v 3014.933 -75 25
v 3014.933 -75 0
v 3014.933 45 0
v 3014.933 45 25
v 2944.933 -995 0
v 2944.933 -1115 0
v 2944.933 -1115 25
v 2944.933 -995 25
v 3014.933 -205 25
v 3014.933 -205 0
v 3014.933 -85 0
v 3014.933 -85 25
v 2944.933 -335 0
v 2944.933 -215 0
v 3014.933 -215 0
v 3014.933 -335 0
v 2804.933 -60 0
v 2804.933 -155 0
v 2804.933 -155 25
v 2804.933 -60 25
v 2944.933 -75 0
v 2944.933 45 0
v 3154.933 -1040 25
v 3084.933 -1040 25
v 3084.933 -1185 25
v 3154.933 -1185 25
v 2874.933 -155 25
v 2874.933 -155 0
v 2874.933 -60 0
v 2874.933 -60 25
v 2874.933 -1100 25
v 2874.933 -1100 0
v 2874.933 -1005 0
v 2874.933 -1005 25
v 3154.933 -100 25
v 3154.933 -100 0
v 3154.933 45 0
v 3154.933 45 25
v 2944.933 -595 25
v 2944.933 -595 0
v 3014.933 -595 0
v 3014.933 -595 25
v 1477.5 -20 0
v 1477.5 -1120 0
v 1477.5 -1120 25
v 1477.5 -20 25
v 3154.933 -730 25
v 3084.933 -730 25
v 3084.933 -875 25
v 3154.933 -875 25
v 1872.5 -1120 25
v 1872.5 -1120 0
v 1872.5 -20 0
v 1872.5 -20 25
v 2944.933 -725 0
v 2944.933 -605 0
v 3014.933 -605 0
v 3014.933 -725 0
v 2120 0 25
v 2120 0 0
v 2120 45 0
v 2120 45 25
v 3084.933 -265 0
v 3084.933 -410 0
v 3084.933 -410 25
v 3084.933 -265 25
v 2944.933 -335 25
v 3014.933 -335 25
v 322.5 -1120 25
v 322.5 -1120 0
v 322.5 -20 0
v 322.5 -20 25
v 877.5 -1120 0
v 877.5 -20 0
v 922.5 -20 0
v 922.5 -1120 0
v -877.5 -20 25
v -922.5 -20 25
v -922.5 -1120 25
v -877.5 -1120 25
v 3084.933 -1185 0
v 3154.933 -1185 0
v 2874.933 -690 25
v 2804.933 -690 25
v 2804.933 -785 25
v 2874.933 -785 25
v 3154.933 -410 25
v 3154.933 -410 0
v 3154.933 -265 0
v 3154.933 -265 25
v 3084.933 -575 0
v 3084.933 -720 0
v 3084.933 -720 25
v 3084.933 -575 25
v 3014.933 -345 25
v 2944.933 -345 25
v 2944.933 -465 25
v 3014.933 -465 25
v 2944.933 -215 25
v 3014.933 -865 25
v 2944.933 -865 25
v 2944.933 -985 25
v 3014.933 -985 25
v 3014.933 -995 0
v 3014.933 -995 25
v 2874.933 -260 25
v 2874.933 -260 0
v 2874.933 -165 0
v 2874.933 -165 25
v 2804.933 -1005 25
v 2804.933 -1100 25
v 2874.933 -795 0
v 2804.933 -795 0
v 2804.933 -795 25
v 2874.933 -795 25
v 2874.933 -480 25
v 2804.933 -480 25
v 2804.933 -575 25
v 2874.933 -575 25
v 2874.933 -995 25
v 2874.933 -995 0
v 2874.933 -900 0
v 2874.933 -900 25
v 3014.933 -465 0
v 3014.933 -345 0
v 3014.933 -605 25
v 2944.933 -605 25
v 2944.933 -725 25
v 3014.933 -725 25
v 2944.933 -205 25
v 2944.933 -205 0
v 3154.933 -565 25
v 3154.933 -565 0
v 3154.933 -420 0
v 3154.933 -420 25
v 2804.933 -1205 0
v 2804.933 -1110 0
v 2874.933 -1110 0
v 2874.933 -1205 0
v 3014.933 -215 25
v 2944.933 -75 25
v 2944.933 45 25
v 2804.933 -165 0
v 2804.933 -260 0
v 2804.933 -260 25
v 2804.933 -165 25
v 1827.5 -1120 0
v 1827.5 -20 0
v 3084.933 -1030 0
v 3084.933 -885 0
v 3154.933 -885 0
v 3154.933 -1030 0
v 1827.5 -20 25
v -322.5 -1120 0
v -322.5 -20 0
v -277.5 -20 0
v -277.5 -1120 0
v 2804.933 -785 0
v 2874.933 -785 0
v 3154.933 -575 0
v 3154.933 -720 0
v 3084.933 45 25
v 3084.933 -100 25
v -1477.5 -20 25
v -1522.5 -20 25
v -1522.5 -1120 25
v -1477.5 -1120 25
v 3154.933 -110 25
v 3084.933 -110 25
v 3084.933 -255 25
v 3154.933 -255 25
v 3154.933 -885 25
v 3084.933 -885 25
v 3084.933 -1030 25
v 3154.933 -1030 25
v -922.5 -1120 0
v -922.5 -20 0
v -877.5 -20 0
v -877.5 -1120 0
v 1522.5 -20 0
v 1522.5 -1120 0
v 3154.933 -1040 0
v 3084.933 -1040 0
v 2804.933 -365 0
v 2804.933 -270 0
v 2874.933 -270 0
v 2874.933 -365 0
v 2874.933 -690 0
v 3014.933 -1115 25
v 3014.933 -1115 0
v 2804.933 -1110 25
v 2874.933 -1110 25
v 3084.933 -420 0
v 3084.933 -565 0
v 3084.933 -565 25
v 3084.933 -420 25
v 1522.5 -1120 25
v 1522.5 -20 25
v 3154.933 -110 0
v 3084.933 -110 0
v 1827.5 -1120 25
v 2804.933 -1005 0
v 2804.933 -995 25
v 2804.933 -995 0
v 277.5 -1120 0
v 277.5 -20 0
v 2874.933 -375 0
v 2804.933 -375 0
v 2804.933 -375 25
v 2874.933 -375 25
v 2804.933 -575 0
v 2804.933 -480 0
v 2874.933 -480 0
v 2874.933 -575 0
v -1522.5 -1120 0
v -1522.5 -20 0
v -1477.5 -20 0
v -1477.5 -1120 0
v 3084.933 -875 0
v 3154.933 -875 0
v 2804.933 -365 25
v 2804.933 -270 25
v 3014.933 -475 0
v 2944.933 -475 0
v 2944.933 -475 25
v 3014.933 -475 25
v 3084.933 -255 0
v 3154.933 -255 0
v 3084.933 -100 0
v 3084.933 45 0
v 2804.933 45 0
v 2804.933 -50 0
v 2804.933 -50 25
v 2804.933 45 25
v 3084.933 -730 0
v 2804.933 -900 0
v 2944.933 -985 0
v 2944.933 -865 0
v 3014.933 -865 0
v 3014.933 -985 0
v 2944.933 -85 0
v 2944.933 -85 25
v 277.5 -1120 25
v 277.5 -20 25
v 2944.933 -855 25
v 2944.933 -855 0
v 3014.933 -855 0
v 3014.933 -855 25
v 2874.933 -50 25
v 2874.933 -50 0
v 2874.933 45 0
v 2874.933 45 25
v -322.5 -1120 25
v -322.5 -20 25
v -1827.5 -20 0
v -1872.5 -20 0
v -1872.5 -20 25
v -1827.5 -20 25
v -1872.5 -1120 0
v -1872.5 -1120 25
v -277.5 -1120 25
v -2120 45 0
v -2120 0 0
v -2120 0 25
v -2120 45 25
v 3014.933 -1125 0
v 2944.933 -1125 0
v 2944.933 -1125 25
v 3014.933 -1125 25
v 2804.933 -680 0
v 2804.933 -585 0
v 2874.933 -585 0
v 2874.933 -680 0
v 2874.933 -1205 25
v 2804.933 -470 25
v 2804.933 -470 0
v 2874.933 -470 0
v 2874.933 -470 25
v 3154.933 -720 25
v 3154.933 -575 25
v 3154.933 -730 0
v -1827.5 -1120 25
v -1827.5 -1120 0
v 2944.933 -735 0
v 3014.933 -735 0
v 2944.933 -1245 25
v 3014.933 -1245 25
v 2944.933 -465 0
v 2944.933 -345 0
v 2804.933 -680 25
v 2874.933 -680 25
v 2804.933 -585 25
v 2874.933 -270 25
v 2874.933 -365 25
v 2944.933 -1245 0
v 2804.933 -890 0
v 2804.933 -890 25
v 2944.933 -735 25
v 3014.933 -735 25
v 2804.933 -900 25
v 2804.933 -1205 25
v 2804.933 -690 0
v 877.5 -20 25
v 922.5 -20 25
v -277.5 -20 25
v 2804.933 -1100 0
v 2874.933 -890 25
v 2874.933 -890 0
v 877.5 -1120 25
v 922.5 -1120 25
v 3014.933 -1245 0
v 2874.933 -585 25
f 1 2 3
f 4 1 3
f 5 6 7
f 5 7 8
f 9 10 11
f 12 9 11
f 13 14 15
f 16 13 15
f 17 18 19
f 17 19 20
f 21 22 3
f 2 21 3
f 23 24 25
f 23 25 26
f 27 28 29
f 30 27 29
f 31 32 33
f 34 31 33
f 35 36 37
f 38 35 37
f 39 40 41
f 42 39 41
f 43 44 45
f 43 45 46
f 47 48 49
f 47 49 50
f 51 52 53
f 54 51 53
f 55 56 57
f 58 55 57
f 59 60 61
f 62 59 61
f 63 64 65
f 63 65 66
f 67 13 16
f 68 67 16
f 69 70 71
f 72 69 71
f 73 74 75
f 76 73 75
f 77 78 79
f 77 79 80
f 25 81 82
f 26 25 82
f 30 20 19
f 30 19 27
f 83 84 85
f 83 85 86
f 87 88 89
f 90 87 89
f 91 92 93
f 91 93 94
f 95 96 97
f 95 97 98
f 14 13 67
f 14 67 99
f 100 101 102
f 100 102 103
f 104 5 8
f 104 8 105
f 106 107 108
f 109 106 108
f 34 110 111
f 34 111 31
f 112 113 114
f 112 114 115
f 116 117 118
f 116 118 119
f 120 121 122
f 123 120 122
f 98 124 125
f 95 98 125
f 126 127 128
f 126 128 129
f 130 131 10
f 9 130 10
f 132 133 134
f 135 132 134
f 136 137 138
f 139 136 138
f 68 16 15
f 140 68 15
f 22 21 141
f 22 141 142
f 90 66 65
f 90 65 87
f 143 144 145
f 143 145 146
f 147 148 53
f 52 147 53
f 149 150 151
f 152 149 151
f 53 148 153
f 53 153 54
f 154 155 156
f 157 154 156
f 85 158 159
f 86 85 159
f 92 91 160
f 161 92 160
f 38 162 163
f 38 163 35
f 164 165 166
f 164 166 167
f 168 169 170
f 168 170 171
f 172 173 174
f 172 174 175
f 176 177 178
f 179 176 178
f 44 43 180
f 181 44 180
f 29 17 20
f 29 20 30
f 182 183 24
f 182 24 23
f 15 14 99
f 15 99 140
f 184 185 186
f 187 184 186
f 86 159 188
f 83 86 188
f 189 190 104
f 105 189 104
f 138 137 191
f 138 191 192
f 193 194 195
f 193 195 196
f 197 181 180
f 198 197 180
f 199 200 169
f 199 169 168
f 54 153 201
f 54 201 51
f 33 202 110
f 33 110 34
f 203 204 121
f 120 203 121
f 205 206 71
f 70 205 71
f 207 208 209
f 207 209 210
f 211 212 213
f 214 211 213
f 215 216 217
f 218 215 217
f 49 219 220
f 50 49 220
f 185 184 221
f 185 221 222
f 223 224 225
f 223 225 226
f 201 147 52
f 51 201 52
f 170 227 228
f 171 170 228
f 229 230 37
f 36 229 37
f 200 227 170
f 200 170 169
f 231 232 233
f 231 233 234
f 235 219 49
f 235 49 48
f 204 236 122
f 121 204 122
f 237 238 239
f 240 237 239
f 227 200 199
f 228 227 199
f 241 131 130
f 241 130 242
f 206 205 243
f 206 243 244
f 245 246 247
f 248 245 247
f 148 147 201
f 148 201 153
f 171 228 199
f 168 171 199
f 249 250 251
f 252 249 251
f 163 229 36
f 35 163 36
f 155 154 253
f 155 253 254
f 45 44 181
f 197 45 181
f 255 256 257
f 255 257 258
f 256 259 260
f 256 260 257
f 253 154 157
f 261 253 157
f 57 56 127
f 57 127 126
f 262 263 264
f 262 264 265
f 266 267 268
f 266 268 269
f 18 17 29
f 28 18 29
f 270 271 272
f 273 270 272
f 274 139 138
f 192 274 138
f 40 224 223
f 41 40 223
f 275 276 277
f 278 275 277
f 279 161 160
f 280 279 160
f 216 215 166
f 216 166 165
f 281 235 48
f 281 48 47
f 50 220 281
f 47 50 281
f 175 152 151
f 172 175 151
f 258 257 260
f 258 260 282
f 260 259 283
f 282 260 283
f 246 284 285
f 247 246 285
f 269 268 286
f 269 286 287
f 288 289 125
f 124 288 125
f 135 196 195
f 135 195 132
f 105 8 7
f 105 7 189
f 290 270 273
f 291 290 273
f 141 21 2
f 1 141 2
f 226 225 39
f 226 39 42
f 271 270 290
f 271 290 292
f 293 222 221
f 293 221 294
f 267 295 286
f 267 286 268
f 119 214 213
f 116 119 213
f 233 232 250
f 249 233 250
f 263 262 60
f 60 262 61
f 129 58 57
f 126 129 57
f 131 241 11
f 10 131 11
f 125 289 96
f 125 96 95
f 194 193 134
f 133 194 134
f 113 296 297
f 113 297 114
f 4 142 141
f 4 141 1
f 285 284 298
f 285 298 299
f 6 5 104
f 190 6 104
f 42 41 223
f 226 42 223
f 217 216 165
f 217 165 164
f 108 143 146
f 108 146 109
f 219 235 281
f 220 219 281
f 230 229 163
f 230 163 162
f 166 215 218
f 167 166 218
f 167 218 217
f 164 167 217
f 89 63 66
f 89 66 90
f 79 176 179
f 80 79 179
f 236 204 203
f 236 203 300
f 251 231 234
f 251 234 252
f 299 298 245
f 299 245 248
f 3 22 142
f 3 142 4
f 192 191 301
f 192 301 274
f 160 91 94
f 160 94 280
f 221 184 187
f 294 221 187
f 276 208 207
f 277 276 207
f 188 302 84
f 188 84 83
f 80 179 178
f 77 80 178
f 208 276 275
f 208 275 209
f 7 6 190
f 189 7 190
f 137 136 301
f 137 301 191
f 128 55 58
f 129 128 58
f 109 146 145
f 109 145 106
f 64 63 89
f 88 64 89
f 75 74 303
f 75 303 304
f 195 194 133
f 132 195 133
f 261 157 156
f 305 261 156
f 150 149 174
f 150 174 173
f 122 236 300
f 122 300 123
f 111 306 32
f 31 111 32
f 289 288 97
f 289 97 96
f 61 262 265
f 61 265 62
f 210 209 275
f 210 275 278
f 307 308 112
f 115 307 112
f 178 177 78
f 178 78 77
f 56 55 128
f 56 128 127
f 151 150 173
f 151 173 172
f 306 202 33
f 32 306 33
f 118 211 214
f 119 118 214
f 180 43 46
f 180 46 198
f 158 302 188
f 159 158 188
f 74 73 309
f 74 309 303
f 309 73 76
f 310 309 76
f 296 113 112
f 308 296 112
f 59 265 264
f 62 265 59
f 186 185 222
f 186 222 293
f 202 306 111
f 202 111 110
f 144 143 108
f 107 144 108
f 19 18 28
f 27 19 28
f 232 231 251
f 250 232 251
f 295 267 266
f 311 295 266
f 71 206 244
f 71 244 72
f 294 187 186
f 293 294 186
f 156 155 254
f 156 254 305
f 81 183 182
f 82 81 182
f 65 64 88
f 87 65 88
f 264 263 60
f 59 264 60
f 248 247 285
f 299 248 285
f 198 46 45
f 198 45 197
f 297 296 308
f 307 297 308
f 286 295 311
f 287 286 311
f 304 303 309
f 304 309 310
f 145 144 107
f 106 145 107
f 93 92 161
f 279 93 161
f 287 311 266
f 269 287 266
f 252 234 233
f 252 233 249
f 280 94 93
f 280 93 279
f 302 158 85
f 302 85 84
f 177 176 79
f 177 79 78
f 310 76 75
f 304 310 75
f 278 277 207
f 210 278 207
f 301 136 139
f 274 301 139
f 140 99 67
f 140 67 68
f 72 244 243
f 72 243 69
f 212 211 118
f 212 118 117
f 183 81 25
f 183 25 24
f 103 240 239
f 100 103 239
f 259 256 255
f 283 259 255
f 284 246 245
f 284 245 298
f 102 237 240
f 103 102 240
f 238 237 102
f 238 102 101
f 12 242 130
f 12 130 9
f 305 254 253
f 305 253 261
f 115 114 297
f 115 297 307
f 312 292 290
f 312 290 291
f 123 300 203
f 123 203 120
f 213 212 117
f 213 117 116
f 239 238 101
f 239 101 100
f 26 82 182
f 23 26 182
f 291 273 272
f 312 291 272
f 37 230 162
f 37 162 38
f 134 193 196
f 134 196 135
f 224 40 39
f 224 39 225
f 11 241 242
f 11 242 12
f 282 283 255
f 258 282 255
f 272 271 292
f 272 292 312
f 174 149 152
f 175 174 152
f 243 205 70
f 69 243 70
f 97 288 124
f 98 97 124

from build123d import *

# Parameters (mm, degrees)
F0_W     = 4240
F0_H     = 45
F0_W_2   = 45
F0_H_2   = 1100
F0_W_3   = 70
F0_H_3   = 95
F0_H_4   = 120
F0_H_5   = 145
F1_DEPTH = 25


with BuildPart() as f1:
    # F0 (on Top) → F1 (new body)
    with BuildSketch(Plane.XY):
        with Locations((0, 22.5)):
            Rectangle(F0_W, F0_H)
        with Locations((-1500, -570)):
            Rectangle(F0_W_2, F0_H_2)
        with Locations((2839.933071, -2.5)):
            Rectangle(F0_W_3, F0_H_3)
        with Locations((2839.933071, -107.5)):
            Rectangle(F0_W_3, F0_H_3)
        with Locations((2839.933071, -212.5)):
            Rectangle(F0_W_3, F0_H_3)
        with Locations((2839.933071, -317.5)):
            Rectangle(F0_W_3, F0_H_3)
        with Locations((2839.933071, -422.5)):
            Rectangle(F0_W_3, F0_H_3)
        with Locations((2839.933071, -527.5)):
            Rectangle(F0_W_3, F0_H_3)
        with Locations((2839.933071, -632.5)):
            Rectangle(F0_W_3, F0_H_3)
        with Locations((2839.933071, -737.5)):
            Rectangle(F0_W_3, F0_H_3)
        with Locations((2839.933071, -842.5)):
            Rectangle(F0_W_3, F0_H_3)
        with Locations((2839.933071, -947.5)):
            Rectangle(F0_W_3, F0_H_3)
        with Locations((2839.933071, -1052.5)):
            Rectangle(F0_W_3, F0_H_3)
        with Locations((2839.933071, -1157.5)):
            Rectangle(F0_W_3, F0_H_3)
        with Locations((-900, -570)):
            Rectangle(F0_W_2, F0_H_2)
        with Locations((-300, -570)):
            Rectangle(F0_W_2, F0_H_2)
        with Locations((300, -570)):
            Rectangle(F0_W_2, F0_H_2)
        with Locations((900, -570)):
            Rectangle(F0_W_2, F0_H_2)
        with Locations((1500, -570)):
            Rectangle(F0_W_2, F0_H_2)
        with Locations((2979.933071, -15)):
            Rectangle(F0_W_3, F0_H_4)
        with Locations((3119.933071, -27.5)):
            Rectangle(F0_W_3, F0_H_5)
        with Locations((2979.933071, -145)):
            Rectangle(F0_W_3, F0_H_4)
        with Locations((2979.933071, -275)):
            Rectangle(F0_W_3, F0_H_4)
        with Locations((2979.933071, -405)):
            Rectangle(F0_W_3, F0_H_4)
        with Locations((2979.933071, -535)):
            Rectangle(F0_W_3, F0_H_4)
        with Locations((2979.933071, -665)):
            Rectangle(F0_W_3, F0_H_4)
        with Locations((2979.933071, -795)):
            Rectangle(F0_W_3, F0_H_4)
        with Locations((2979.933071, -925)):
            Rectangle(F0_W_3, F0_H_4)
        with Locations((2979.933071, -1055)):
            Rectangle(F0_W_3, F0_H_4)
        with Locations((2979.933071, -1185)):
            Rectangle(F0_W_3, F0_H_4)
        with Locations((3119.933071, -182.5)):
            Rectangle(F0_W_3, F0_H_5)
        with Locations((3119.933071, -337.5)):
            Rectangle(F0_W_3, F0_H_5)
        with Locations((3119.933071, -492.5)):
            Rectangle(F0_W_3, F0_H_5)
        with Locations((3119.933071, -647.5)):
            Rectangle(F0_W_3, F0_H_5)
        with Locations((3119.933071, -802.5)):
            Rectangle(F0_W_3, F0_H_5)
        with Locations((3119.933071, -957.5)):
            Rectangle(F0_W_3, F0_H_5)
        with Locations((3119.933071, -1112.5)):
            Rectangle(F0_W_3, F0_H_5)
        with Locations((1850, -570)):
            Rectangle(F0_W_2, F0_H_2)
        with Locations((-1850, -570)):
            Rectangle(F0_W_2, F0_H_2)
    extrude(amount=F1_DEPTH)


solid = f1.part
